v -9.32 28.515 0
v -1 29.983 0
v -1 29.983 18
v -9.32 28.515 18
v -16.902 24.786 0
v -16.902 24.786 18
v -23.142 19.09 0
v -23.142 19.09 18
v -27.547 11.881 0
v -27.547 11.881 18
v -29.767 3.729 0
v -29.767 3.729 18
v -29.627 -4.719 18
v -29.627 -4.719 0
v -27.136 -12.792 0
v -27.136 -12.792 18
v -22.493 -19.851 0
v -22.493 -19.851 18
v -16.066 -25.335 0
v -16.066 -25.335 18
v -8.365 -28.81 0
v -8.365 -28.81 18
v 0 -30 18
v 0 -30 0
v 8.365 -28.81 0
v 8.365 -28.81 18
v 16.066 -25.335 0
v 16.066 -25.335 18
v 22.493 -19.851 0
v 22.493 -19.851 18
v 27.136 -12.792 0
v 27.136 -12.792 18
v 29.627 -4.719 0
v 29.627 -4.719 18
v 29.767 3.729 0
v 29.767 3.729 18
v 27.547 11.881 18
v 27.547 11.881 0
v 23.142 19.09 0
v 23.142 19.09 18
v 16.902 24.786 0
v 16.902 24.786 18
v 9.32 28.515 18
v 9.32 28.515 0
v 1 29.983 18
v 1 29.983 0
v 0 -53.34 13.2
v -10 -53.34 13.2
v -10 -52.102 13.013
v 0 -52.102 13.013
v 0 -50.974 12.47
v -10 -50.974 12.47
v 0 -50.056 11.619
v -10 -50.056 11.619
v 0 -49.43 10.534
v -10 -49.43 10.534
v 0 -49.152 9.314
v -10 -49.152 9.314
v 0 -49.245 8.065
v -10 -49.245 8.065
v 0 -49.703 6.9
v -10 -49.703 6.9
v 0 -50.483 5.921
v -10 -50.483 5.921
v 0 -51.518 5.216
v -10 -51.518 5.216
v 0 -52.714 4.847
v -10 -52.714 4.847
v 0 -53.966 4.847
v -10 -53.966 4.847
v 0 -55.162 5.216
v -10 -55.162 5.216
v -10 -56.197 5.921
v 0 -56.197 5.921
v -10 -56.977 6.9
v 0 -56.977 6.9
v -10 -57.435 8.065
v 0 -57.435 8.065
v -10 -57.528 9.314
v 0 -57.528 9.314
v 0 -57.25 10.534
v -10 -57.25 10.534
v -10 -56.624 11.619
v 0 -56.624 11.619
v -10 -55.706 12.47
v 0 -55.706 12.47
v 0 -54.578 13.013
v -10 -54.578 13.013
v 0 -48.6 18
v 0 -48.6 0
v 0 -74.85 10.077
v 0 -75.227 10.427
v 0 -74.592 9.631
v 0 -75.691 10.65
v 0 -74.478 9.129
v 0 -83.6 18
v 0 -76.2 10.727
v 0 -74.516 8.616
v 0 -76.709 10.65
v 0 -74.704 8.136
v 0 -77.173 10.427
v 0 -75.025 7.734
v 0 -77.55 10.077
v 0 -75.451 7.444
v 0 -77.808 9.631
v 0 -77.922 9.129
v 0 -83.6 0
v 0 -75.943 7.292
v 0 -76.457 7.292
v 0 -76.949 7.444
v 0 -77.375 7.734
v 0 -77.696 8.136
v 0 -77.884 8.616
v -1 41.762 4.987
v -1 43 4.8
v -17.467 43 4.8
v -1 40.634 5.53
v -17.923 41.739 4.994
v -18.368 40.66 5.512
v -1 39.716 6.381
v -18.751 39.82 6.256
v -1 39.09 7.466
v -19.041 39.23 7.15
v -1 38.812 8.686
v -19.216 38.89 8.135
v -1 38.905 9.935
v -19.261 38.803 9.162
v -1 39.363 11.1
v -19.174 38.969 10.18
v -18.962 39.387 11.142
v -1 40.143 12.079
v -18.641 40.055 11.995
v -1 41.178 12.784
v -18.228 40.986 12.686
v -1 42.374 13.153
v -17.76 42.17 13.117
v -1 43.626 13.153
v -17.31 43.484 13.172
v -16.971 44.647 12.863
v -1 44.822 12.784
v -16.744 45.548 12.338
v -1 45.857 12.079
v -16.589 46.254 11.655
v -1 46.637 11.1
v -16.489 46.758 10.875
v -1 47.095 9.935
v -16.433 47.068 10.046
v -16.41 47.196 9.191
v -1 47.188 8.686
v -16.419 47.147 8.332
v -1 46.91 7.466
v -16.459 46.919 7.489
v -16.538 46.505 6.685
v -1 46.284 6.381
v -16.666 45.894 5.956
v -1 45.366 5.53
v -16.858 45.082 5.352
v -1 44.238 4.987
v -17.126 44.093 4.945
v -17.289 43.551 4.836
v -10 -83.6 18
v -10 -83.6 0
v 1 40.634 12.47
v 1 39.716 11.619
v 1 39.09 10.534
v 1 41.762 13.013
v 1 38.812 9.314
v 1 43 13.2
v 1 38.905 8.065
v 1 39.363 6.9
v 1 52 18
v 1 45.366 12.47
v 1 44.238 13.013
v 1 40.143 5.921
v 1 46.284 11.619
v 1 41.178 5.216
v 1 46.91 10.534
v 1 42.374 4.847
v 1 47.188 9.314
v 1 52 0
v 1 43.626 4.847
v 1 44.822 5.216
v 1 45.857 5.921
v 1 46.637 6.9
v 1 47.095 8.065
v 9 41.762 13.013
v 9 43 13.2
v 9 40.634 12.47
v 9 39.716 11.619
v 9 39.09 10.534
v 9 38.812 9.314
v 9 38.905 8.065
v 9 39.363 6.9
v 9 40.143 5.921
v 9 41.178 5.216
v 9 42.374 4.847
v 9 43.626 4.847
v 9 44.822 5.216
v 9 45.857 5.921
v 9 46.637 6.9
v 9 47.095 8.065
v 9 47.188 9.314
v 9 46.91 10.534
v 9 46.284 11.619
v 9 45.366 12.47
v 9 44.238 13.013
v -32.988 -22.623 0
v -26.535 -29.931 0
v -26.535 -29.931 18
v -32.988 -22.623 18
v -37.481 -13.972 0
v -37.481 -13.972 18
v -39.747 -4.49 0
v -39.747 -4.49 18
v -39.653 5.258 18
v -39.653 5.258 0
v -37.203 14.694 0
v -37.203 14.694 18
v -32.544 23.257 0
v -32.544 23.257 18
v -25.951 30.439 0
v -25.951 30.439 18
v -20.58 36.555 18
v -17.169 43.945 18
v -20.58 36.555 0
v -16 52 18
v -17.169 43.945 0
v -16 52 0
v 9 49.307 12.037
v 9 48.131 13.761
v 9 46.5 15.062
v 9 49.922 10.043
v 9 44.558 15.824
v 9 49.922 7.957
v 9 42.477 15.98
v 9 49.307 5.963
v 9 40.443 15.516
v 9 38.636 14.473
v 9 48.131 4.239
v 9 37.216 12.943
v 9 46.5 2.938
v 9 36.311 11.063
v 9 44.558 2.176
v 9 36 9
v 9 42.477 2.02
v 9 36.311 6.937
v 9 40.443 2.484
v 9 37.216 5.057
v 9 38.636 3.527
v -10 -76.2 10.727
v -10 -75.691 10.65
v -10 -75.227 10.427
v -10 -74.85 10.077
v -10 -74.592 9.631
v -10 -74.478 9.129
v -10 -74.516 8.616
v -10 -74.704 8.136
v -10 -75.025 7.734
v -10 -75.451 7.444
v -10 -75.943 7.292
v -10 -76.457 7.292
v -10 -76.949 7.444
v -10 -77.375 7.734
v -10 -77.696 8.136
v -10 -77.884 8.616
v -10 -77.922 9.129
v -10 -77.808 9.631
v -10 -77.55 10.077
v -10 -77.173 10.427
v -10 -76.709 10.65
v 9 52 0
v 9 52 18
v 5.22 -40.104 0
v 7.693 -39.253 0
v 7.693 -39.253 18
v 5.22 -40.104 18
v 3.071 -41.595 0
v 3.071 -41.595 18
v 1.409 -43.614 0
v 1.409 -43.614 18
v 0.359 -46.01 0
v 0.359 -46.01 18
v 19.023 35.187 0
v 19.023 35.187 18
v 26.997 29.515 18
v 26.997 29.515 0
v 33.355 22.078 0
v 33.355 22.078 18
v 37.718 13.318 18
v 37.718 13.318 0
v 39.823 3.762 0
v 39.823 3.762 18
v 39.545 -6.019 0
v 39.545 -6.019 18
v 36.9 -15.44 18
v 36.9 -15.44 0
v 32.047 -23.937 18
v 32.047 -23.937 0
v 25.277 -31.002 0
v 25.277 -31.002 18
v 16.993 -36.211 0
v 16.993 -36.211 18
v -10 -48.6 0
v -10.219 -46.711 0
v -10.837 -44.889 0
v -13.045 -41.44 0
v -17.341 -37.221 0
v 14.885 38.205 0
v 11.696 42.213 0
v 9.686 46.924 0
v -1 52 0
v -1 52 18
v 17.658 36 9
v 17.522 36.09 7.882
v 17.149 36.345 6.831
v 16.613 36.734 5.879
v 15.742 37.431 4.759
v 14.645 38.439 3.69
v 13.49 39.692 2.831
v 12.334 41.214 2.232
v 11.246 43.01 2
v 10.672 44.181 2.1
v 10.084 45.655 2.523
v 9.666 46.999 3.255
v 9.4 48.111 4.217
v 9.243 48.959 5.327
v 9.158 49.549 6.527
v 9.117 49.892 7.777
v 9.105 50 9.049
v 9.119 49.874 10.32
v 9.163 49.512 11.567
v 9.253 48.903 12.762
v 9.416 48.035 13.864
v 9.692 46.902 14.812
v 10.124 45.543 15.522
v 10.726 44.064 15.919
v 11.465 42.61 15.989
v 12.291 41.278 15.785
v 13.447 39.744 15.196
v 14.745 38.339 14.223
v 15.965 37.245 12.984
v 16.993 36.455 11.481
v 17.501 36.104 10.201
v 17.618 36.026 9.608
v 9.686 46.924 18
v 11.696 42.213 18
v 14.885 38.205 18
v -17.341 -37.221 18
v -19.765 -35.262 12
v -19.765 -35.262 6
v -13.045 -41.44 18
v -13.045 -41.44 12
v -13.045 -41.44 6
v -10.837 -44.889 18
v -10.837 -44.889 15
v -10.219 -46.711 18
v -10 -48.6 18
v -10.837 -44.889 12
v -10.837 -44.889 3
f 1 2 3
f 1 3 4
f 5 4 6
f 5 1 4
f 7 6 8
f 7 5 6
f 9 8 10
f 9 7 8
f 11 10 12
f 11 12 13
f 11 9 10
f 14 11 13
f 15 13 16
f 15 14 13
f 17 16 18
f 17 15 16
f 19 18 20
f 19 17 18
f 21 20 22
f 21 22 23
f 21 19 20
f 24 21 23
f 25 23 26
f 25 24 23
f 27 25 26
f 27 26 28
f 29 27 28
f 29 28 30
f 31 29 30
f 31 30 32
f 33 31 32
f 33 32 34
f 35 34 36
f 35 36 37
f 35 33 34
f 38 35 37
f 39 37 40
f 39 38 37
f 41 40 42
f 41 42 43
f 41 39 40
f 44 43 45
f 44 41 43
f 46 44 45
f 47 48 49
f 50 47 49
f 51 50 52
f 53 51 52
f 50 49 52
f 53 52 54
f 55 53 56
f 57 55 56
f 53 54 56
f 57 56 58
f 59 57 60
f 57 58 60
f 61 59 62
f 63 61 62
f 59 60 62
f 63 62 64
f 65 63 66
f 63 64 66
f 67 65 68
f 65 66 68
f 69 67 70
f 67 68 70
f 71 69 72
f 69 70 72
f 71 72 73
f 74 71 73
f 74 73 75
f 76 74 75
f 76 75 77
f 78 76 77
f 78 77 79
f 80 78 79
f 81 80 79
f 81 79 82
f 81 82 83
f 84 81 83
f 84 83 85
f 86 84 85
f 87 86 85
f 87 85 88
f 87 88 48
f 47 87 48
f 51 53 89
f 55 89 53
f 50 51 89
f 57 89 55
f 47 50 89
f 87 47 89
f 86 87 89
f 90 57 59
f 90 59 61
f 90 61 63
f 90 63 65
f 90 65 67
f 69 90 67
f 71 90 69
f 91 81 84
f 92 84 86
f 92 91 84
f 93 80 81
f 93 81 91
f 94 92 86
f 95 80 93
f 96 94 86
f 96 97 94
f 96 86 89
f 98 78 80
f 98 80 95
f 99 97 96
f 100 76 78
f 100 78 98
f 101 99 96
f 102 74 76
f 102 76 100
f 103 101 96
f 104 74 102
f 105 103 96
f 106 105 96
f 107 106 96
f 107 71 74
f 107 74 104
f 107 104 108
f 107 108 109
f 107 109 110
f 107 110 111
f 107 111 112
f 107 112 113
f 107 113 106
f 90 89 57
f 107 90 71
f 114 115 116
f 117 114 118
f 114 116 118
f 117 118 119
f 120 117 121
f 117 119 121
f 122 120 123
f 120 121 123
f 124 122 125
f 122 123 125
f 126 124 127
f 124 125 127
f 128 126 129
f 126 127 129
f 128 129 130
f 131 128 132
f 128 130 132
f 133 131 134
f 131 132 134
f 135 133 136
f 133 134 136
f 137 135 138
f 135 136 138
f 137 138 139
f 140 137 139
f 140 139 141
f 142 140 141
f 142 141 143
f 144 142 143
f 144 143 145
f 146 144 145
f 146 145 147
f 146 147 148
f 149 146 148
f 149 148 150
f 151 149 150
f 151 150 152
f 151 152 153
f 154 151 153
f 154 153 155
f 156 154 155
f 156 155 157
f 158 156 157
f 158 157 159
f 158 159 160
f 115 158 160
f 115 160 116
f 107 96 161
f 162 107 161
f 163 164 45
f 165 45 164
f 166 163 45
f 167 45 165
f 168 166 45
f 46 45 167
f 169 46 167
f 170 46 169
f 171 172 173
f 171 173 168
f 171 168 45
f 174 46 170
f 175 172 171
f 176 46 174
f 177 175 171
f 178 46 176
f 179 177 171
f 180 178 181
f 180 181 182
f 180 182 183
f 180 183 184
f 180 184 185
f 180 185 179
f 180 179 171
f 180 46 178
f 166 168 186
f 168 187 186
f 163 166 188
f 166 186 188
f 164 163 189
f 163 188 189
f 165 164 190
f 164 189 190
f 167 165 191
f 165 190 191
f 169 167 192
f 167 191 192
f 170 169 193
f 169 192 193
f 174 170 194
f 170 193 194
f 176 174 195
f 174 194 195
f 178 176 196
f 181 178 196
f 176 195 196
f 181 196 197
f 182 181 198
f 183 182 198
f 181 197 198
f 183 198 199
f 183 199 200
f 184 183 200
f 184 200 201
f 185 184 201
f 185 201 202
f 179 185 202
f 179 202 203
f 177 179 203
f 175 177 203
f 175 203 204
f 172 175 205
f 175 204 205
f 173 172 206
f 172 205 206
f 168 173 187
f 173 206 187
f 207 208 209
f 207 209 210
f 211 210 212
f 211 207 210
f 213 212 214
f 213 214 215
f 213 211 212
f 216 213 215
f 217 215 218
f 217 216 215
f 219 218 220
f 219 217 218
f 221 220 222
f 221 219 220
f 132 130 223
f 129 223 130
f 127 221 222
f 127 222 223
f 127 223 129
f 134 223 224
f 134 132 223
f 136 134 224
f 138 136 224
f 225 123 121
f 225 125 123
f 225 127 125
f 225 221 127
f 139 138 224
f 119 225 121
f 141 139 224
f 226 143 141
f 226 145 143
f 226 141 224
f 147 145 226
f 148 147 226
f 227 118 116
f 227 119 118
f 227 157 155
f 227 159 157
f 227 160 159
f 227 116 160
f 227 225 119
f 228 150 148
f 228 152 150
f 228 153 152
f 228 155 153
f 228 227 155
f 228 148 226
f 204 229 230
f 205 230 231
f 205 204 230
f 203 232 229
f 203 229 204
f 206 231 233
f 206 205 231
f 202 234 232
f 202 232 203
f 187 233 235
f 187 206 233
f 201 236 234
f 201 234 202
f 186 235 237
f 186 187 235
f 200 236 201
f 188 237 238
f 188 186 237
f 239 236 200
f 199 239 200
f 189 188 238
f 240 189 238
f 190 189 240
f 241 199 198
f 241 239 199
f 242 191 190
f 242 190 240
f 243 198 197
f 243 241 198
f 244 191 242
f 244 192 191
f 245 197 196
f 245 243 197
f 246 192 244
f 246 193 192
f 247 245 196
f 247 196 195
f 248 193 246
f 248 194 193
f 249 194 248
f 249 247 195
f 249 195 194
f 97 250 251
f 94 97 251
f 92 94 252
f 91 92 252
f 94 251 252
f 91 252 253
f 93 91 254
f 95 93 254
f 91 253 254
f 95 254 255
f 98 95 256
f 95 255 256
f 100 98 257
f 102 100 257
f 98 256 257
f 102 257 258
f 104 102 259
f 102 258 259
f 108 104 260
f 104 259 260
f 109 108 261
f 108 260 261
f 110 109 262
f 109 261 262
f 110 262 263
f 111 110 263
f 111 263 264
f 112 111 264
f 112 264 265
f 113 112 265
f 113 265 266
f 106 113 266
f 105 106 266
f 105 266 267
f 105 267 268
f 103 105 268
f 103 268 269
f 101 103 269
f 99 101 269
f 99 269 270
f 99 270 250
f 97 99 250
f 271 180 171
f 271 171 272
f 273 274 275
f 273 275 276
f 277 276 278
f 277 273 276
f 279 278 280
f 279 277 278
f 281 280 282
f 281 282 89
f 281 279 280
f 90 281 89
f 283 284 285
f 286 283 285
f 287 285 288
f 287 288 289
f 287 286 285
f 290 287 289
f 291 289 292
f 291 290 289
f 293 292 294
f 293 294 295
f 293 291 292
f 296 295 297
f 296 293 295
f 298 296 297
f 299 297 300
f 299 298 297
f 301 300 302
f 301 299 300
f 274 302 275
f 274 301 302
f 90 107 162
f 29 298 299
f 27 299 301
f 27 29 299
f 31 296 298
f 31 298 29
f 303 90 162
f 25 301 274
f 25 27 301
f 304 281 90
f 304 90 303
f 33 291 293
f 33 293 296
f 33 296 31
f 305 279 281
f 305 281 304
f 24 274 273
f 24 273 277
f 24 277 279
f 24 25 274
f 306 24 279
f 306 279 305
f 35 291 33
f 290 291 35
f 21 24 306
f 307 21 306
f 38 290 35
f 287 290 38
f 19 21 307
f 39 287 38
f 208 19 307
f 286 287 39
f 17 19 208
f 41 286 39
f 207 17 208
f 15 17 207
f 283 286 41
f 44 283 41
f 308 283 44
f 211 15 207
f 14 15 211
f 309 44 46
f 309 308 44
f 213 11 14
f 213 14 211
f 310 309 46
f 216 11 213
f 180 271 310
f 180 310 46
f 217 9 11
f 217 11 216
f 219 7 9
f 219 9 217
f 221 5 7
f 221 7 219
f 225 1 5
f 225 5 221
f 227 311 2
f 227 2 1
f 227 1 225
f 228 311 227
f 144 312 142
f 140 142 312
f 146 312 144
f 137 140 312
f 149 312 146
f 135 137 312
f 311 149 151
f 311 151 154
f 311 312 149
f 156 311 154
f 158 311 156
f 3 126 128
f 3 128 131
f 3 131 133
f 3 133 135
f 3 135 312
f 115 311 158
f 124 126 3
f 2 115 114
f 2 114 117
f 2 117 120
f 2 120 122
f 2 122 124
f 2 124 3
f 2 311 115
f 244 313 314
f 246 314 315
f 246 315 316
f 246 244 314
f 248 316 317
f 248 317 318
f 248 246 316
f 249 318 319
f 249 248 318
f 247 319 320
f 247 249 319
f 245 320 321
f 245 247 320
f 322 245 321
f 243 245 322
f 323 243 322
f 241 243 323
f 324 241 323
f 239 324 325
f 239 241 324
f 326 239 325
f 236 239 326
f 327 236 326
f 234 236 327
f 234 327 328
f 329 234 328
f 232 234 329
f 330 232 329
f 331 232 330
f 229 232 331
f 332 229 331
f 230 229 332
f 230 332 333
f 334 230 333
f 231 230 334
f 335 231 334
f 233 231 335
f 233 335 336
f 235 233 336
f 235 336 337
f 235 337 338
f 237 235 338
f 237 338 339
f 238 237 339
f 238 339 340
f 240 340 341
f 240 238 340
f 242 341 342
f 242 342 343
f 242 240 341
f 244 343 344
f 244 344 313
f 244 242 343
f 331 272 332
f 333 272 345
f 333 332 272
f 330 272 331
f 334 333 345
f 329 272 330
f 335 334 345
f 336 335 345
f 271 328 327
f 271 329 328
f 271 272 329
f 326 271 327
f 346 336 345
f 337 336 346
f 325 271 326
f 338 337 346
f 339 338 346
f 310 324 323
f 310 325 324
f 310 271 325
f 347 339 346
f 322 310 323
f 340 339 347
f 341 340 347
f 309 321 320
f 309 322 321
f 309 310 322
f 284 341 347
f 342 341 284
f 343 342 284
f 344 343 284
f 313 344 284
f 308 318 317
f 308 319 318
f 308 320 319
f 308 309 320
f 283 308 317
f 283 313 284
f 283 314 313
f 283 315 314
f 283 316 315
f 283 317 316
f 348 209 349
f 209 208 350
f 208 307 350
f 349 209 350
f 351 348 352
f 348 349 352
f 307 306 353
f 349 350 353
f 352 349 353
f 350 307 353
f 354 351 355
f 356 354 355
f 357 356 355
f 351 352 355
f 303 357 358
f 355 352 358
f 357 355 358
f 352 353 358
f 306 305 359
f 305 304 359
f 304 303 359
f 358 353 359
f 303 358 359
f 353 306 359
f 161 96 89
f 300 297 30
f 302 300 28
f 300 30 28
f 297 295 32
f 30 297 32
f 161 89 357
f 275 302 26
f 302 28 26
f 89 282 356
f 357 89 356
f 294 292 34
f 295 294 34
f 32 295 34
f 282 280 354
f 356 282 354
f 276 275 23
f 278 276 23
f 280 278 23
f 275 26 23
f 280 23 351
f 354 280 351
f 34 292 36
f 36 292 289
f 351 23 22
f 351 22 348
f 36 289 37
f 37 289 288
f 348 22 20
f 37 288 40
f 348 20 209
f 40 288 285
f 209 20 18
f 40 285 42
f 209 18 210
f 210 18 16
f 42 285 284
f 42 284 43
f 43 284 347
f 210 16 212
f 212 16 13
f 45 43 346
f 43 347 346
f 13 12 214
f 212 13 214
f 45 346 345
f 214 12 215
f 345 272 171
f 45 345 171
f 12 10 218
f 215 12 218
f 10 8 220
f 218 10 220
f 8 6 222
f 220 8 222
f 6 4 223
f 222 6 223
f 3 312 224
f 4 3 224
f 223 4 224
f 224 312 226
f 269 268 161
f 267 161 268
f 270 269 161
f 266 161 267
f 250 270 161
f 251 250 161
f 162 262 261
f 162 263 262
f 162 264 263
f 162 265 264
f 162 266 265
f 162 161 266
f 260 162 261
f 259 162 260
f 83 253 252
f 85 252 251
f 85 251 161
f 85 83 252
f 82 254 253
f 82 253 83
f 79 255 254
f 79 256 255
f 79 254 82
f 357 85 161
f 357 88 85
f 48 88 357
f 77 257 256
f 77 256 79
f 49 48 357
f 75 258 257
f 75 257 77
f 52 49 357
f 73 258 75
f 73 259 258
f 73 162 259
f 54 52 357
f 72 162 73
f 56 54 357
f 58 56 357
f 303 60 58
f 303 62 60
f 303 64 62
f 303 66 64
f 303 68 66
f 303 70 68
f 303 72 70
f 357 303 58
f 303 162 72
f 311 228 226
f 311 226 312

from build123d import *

# Parameters (mm, degrees)
MAIN_BODY_DEPTH       = 18
SKETCH14_W            = 4.2
SKETCH14_H            = 39
M8_CLEARANCE_HOLE2_D  = 8.4
M8_CLEARANCE_HOLE3_D  = 8.4
SKETCH27_R            = 7
CUT_EXTRUDE2_DEPTH    = 99.559772913
F_8_32_TAPPED_HOLE1_D = 3.4544


with BuildPart() as part:
    # Sketch1 → main body (new body)
    with BuildSketch(Plane.XY):
        with BuildLine():
            Line((0, -48.600411521), (0, -83.600411521))
            Line((0, -83.600411521), (-10, -83.600411521))
            Line((-10, -83.600411521), (-10, -48.600411521))
            add(Edge.make_bspline(
                [(-26.535230031, -29.931280748), (-20.948212629, -34.88438627), (-10, -40.904022772), (-10, -48.600411521)],
                knots=[0, 0, 0, 0, 1, 1, 1, 1], degree=3))
            ThreePointArc((-26.535230031, -29.931280748), (-39.998128482, 0.386934068), (-25.951219512, 30.43902439))
            ThreePointArc((-25.951219512, 30.43902439), (-18.607817439, 40.126684972), (-16, 52))
            Line((-16, 52), (-1, 52))
            Line((-1, 52), (-1, 29.983328701))
            ThreePointArc((-1, 29.983328701), (0, -30), (1, 29.983328701))
            Line((1, 29.983328701), (1, 52))
            Line((1, 52), (9, 52))
            ThreePointArc((9, 52), (11.695932832, 42.212959957), (19.02319236, 35.186903138))
            ThreePointArc((19.02319236, 35.186903138), (39.54457484, -6.018853774), (7.693084301, -39.253234949))
            ThreePointArc((7.693084301, -39.253234949), (2.170592409, -42.547452411), (0, -48.600411521))
        make_face()
    extrude(amount=MAIN_BODY_DEPTH)

    # Sketch14 → M8 Clearance Hole1 (revolve, cut)
    with BuildSketch(Plane(origin=(1, 43, 9), x_dir=(0, 0, 1), z_dir=(0, 1, 0))):
        with Locations((2.1, 19.5)):
            Rectangle(SKETCH14_W, SKETCH14_H)
    revolve(axis=Axis((-5.35, 43, 9), (1, 0, 0)), mode=Mode.SUBTRACT)

    # M8 Clearance Hole2 (through all)
    with Locations(Plane(origin=(1, 0, 0), x_dir=(0, 0, 1), z_dir=(1, 0, 0))):
        with Locations((9, -43)):
            Hole(M8_CLEARANCE_HOLE2_D / 2)

    # M8 Clearance Hole3 (through all)
    with Locations(Plane(origin=(0, 0, 0), x_dir=(0, 0, -1), z_dir=(1, 0, 0))):
        with Locations((-9, -53.34)):
            Hole(M8_CLEARANCE_HOLE3_D / 2)

    # Sketch27 → Cut-Extrude2 (cut, through all)
    with BuildSketch(Plane(origin=(9, 0, 0), x_dir=(0, 0, -1), z_dir=(1, 0, 0))):
        with Locations(Location((-9, 43, 0), (0, 0, 270))):
            Circle(SKETCH27_R)
    extrude(amount=CUT_EXTRUDE2_DEPTH, mode=Mode.SUBTRACT)

    # #8-32 Tapped Hole1 (through all)
    with Locations(Plane(origin=(0, 0, 0), x_dir=(0, 0, -1), z_dir=(1, 0, 0))):
        with Locations((-9, -76.2)):
            Hole(F_8_32_TAPPED_HOLE1_D / 2)


solid = part.part
